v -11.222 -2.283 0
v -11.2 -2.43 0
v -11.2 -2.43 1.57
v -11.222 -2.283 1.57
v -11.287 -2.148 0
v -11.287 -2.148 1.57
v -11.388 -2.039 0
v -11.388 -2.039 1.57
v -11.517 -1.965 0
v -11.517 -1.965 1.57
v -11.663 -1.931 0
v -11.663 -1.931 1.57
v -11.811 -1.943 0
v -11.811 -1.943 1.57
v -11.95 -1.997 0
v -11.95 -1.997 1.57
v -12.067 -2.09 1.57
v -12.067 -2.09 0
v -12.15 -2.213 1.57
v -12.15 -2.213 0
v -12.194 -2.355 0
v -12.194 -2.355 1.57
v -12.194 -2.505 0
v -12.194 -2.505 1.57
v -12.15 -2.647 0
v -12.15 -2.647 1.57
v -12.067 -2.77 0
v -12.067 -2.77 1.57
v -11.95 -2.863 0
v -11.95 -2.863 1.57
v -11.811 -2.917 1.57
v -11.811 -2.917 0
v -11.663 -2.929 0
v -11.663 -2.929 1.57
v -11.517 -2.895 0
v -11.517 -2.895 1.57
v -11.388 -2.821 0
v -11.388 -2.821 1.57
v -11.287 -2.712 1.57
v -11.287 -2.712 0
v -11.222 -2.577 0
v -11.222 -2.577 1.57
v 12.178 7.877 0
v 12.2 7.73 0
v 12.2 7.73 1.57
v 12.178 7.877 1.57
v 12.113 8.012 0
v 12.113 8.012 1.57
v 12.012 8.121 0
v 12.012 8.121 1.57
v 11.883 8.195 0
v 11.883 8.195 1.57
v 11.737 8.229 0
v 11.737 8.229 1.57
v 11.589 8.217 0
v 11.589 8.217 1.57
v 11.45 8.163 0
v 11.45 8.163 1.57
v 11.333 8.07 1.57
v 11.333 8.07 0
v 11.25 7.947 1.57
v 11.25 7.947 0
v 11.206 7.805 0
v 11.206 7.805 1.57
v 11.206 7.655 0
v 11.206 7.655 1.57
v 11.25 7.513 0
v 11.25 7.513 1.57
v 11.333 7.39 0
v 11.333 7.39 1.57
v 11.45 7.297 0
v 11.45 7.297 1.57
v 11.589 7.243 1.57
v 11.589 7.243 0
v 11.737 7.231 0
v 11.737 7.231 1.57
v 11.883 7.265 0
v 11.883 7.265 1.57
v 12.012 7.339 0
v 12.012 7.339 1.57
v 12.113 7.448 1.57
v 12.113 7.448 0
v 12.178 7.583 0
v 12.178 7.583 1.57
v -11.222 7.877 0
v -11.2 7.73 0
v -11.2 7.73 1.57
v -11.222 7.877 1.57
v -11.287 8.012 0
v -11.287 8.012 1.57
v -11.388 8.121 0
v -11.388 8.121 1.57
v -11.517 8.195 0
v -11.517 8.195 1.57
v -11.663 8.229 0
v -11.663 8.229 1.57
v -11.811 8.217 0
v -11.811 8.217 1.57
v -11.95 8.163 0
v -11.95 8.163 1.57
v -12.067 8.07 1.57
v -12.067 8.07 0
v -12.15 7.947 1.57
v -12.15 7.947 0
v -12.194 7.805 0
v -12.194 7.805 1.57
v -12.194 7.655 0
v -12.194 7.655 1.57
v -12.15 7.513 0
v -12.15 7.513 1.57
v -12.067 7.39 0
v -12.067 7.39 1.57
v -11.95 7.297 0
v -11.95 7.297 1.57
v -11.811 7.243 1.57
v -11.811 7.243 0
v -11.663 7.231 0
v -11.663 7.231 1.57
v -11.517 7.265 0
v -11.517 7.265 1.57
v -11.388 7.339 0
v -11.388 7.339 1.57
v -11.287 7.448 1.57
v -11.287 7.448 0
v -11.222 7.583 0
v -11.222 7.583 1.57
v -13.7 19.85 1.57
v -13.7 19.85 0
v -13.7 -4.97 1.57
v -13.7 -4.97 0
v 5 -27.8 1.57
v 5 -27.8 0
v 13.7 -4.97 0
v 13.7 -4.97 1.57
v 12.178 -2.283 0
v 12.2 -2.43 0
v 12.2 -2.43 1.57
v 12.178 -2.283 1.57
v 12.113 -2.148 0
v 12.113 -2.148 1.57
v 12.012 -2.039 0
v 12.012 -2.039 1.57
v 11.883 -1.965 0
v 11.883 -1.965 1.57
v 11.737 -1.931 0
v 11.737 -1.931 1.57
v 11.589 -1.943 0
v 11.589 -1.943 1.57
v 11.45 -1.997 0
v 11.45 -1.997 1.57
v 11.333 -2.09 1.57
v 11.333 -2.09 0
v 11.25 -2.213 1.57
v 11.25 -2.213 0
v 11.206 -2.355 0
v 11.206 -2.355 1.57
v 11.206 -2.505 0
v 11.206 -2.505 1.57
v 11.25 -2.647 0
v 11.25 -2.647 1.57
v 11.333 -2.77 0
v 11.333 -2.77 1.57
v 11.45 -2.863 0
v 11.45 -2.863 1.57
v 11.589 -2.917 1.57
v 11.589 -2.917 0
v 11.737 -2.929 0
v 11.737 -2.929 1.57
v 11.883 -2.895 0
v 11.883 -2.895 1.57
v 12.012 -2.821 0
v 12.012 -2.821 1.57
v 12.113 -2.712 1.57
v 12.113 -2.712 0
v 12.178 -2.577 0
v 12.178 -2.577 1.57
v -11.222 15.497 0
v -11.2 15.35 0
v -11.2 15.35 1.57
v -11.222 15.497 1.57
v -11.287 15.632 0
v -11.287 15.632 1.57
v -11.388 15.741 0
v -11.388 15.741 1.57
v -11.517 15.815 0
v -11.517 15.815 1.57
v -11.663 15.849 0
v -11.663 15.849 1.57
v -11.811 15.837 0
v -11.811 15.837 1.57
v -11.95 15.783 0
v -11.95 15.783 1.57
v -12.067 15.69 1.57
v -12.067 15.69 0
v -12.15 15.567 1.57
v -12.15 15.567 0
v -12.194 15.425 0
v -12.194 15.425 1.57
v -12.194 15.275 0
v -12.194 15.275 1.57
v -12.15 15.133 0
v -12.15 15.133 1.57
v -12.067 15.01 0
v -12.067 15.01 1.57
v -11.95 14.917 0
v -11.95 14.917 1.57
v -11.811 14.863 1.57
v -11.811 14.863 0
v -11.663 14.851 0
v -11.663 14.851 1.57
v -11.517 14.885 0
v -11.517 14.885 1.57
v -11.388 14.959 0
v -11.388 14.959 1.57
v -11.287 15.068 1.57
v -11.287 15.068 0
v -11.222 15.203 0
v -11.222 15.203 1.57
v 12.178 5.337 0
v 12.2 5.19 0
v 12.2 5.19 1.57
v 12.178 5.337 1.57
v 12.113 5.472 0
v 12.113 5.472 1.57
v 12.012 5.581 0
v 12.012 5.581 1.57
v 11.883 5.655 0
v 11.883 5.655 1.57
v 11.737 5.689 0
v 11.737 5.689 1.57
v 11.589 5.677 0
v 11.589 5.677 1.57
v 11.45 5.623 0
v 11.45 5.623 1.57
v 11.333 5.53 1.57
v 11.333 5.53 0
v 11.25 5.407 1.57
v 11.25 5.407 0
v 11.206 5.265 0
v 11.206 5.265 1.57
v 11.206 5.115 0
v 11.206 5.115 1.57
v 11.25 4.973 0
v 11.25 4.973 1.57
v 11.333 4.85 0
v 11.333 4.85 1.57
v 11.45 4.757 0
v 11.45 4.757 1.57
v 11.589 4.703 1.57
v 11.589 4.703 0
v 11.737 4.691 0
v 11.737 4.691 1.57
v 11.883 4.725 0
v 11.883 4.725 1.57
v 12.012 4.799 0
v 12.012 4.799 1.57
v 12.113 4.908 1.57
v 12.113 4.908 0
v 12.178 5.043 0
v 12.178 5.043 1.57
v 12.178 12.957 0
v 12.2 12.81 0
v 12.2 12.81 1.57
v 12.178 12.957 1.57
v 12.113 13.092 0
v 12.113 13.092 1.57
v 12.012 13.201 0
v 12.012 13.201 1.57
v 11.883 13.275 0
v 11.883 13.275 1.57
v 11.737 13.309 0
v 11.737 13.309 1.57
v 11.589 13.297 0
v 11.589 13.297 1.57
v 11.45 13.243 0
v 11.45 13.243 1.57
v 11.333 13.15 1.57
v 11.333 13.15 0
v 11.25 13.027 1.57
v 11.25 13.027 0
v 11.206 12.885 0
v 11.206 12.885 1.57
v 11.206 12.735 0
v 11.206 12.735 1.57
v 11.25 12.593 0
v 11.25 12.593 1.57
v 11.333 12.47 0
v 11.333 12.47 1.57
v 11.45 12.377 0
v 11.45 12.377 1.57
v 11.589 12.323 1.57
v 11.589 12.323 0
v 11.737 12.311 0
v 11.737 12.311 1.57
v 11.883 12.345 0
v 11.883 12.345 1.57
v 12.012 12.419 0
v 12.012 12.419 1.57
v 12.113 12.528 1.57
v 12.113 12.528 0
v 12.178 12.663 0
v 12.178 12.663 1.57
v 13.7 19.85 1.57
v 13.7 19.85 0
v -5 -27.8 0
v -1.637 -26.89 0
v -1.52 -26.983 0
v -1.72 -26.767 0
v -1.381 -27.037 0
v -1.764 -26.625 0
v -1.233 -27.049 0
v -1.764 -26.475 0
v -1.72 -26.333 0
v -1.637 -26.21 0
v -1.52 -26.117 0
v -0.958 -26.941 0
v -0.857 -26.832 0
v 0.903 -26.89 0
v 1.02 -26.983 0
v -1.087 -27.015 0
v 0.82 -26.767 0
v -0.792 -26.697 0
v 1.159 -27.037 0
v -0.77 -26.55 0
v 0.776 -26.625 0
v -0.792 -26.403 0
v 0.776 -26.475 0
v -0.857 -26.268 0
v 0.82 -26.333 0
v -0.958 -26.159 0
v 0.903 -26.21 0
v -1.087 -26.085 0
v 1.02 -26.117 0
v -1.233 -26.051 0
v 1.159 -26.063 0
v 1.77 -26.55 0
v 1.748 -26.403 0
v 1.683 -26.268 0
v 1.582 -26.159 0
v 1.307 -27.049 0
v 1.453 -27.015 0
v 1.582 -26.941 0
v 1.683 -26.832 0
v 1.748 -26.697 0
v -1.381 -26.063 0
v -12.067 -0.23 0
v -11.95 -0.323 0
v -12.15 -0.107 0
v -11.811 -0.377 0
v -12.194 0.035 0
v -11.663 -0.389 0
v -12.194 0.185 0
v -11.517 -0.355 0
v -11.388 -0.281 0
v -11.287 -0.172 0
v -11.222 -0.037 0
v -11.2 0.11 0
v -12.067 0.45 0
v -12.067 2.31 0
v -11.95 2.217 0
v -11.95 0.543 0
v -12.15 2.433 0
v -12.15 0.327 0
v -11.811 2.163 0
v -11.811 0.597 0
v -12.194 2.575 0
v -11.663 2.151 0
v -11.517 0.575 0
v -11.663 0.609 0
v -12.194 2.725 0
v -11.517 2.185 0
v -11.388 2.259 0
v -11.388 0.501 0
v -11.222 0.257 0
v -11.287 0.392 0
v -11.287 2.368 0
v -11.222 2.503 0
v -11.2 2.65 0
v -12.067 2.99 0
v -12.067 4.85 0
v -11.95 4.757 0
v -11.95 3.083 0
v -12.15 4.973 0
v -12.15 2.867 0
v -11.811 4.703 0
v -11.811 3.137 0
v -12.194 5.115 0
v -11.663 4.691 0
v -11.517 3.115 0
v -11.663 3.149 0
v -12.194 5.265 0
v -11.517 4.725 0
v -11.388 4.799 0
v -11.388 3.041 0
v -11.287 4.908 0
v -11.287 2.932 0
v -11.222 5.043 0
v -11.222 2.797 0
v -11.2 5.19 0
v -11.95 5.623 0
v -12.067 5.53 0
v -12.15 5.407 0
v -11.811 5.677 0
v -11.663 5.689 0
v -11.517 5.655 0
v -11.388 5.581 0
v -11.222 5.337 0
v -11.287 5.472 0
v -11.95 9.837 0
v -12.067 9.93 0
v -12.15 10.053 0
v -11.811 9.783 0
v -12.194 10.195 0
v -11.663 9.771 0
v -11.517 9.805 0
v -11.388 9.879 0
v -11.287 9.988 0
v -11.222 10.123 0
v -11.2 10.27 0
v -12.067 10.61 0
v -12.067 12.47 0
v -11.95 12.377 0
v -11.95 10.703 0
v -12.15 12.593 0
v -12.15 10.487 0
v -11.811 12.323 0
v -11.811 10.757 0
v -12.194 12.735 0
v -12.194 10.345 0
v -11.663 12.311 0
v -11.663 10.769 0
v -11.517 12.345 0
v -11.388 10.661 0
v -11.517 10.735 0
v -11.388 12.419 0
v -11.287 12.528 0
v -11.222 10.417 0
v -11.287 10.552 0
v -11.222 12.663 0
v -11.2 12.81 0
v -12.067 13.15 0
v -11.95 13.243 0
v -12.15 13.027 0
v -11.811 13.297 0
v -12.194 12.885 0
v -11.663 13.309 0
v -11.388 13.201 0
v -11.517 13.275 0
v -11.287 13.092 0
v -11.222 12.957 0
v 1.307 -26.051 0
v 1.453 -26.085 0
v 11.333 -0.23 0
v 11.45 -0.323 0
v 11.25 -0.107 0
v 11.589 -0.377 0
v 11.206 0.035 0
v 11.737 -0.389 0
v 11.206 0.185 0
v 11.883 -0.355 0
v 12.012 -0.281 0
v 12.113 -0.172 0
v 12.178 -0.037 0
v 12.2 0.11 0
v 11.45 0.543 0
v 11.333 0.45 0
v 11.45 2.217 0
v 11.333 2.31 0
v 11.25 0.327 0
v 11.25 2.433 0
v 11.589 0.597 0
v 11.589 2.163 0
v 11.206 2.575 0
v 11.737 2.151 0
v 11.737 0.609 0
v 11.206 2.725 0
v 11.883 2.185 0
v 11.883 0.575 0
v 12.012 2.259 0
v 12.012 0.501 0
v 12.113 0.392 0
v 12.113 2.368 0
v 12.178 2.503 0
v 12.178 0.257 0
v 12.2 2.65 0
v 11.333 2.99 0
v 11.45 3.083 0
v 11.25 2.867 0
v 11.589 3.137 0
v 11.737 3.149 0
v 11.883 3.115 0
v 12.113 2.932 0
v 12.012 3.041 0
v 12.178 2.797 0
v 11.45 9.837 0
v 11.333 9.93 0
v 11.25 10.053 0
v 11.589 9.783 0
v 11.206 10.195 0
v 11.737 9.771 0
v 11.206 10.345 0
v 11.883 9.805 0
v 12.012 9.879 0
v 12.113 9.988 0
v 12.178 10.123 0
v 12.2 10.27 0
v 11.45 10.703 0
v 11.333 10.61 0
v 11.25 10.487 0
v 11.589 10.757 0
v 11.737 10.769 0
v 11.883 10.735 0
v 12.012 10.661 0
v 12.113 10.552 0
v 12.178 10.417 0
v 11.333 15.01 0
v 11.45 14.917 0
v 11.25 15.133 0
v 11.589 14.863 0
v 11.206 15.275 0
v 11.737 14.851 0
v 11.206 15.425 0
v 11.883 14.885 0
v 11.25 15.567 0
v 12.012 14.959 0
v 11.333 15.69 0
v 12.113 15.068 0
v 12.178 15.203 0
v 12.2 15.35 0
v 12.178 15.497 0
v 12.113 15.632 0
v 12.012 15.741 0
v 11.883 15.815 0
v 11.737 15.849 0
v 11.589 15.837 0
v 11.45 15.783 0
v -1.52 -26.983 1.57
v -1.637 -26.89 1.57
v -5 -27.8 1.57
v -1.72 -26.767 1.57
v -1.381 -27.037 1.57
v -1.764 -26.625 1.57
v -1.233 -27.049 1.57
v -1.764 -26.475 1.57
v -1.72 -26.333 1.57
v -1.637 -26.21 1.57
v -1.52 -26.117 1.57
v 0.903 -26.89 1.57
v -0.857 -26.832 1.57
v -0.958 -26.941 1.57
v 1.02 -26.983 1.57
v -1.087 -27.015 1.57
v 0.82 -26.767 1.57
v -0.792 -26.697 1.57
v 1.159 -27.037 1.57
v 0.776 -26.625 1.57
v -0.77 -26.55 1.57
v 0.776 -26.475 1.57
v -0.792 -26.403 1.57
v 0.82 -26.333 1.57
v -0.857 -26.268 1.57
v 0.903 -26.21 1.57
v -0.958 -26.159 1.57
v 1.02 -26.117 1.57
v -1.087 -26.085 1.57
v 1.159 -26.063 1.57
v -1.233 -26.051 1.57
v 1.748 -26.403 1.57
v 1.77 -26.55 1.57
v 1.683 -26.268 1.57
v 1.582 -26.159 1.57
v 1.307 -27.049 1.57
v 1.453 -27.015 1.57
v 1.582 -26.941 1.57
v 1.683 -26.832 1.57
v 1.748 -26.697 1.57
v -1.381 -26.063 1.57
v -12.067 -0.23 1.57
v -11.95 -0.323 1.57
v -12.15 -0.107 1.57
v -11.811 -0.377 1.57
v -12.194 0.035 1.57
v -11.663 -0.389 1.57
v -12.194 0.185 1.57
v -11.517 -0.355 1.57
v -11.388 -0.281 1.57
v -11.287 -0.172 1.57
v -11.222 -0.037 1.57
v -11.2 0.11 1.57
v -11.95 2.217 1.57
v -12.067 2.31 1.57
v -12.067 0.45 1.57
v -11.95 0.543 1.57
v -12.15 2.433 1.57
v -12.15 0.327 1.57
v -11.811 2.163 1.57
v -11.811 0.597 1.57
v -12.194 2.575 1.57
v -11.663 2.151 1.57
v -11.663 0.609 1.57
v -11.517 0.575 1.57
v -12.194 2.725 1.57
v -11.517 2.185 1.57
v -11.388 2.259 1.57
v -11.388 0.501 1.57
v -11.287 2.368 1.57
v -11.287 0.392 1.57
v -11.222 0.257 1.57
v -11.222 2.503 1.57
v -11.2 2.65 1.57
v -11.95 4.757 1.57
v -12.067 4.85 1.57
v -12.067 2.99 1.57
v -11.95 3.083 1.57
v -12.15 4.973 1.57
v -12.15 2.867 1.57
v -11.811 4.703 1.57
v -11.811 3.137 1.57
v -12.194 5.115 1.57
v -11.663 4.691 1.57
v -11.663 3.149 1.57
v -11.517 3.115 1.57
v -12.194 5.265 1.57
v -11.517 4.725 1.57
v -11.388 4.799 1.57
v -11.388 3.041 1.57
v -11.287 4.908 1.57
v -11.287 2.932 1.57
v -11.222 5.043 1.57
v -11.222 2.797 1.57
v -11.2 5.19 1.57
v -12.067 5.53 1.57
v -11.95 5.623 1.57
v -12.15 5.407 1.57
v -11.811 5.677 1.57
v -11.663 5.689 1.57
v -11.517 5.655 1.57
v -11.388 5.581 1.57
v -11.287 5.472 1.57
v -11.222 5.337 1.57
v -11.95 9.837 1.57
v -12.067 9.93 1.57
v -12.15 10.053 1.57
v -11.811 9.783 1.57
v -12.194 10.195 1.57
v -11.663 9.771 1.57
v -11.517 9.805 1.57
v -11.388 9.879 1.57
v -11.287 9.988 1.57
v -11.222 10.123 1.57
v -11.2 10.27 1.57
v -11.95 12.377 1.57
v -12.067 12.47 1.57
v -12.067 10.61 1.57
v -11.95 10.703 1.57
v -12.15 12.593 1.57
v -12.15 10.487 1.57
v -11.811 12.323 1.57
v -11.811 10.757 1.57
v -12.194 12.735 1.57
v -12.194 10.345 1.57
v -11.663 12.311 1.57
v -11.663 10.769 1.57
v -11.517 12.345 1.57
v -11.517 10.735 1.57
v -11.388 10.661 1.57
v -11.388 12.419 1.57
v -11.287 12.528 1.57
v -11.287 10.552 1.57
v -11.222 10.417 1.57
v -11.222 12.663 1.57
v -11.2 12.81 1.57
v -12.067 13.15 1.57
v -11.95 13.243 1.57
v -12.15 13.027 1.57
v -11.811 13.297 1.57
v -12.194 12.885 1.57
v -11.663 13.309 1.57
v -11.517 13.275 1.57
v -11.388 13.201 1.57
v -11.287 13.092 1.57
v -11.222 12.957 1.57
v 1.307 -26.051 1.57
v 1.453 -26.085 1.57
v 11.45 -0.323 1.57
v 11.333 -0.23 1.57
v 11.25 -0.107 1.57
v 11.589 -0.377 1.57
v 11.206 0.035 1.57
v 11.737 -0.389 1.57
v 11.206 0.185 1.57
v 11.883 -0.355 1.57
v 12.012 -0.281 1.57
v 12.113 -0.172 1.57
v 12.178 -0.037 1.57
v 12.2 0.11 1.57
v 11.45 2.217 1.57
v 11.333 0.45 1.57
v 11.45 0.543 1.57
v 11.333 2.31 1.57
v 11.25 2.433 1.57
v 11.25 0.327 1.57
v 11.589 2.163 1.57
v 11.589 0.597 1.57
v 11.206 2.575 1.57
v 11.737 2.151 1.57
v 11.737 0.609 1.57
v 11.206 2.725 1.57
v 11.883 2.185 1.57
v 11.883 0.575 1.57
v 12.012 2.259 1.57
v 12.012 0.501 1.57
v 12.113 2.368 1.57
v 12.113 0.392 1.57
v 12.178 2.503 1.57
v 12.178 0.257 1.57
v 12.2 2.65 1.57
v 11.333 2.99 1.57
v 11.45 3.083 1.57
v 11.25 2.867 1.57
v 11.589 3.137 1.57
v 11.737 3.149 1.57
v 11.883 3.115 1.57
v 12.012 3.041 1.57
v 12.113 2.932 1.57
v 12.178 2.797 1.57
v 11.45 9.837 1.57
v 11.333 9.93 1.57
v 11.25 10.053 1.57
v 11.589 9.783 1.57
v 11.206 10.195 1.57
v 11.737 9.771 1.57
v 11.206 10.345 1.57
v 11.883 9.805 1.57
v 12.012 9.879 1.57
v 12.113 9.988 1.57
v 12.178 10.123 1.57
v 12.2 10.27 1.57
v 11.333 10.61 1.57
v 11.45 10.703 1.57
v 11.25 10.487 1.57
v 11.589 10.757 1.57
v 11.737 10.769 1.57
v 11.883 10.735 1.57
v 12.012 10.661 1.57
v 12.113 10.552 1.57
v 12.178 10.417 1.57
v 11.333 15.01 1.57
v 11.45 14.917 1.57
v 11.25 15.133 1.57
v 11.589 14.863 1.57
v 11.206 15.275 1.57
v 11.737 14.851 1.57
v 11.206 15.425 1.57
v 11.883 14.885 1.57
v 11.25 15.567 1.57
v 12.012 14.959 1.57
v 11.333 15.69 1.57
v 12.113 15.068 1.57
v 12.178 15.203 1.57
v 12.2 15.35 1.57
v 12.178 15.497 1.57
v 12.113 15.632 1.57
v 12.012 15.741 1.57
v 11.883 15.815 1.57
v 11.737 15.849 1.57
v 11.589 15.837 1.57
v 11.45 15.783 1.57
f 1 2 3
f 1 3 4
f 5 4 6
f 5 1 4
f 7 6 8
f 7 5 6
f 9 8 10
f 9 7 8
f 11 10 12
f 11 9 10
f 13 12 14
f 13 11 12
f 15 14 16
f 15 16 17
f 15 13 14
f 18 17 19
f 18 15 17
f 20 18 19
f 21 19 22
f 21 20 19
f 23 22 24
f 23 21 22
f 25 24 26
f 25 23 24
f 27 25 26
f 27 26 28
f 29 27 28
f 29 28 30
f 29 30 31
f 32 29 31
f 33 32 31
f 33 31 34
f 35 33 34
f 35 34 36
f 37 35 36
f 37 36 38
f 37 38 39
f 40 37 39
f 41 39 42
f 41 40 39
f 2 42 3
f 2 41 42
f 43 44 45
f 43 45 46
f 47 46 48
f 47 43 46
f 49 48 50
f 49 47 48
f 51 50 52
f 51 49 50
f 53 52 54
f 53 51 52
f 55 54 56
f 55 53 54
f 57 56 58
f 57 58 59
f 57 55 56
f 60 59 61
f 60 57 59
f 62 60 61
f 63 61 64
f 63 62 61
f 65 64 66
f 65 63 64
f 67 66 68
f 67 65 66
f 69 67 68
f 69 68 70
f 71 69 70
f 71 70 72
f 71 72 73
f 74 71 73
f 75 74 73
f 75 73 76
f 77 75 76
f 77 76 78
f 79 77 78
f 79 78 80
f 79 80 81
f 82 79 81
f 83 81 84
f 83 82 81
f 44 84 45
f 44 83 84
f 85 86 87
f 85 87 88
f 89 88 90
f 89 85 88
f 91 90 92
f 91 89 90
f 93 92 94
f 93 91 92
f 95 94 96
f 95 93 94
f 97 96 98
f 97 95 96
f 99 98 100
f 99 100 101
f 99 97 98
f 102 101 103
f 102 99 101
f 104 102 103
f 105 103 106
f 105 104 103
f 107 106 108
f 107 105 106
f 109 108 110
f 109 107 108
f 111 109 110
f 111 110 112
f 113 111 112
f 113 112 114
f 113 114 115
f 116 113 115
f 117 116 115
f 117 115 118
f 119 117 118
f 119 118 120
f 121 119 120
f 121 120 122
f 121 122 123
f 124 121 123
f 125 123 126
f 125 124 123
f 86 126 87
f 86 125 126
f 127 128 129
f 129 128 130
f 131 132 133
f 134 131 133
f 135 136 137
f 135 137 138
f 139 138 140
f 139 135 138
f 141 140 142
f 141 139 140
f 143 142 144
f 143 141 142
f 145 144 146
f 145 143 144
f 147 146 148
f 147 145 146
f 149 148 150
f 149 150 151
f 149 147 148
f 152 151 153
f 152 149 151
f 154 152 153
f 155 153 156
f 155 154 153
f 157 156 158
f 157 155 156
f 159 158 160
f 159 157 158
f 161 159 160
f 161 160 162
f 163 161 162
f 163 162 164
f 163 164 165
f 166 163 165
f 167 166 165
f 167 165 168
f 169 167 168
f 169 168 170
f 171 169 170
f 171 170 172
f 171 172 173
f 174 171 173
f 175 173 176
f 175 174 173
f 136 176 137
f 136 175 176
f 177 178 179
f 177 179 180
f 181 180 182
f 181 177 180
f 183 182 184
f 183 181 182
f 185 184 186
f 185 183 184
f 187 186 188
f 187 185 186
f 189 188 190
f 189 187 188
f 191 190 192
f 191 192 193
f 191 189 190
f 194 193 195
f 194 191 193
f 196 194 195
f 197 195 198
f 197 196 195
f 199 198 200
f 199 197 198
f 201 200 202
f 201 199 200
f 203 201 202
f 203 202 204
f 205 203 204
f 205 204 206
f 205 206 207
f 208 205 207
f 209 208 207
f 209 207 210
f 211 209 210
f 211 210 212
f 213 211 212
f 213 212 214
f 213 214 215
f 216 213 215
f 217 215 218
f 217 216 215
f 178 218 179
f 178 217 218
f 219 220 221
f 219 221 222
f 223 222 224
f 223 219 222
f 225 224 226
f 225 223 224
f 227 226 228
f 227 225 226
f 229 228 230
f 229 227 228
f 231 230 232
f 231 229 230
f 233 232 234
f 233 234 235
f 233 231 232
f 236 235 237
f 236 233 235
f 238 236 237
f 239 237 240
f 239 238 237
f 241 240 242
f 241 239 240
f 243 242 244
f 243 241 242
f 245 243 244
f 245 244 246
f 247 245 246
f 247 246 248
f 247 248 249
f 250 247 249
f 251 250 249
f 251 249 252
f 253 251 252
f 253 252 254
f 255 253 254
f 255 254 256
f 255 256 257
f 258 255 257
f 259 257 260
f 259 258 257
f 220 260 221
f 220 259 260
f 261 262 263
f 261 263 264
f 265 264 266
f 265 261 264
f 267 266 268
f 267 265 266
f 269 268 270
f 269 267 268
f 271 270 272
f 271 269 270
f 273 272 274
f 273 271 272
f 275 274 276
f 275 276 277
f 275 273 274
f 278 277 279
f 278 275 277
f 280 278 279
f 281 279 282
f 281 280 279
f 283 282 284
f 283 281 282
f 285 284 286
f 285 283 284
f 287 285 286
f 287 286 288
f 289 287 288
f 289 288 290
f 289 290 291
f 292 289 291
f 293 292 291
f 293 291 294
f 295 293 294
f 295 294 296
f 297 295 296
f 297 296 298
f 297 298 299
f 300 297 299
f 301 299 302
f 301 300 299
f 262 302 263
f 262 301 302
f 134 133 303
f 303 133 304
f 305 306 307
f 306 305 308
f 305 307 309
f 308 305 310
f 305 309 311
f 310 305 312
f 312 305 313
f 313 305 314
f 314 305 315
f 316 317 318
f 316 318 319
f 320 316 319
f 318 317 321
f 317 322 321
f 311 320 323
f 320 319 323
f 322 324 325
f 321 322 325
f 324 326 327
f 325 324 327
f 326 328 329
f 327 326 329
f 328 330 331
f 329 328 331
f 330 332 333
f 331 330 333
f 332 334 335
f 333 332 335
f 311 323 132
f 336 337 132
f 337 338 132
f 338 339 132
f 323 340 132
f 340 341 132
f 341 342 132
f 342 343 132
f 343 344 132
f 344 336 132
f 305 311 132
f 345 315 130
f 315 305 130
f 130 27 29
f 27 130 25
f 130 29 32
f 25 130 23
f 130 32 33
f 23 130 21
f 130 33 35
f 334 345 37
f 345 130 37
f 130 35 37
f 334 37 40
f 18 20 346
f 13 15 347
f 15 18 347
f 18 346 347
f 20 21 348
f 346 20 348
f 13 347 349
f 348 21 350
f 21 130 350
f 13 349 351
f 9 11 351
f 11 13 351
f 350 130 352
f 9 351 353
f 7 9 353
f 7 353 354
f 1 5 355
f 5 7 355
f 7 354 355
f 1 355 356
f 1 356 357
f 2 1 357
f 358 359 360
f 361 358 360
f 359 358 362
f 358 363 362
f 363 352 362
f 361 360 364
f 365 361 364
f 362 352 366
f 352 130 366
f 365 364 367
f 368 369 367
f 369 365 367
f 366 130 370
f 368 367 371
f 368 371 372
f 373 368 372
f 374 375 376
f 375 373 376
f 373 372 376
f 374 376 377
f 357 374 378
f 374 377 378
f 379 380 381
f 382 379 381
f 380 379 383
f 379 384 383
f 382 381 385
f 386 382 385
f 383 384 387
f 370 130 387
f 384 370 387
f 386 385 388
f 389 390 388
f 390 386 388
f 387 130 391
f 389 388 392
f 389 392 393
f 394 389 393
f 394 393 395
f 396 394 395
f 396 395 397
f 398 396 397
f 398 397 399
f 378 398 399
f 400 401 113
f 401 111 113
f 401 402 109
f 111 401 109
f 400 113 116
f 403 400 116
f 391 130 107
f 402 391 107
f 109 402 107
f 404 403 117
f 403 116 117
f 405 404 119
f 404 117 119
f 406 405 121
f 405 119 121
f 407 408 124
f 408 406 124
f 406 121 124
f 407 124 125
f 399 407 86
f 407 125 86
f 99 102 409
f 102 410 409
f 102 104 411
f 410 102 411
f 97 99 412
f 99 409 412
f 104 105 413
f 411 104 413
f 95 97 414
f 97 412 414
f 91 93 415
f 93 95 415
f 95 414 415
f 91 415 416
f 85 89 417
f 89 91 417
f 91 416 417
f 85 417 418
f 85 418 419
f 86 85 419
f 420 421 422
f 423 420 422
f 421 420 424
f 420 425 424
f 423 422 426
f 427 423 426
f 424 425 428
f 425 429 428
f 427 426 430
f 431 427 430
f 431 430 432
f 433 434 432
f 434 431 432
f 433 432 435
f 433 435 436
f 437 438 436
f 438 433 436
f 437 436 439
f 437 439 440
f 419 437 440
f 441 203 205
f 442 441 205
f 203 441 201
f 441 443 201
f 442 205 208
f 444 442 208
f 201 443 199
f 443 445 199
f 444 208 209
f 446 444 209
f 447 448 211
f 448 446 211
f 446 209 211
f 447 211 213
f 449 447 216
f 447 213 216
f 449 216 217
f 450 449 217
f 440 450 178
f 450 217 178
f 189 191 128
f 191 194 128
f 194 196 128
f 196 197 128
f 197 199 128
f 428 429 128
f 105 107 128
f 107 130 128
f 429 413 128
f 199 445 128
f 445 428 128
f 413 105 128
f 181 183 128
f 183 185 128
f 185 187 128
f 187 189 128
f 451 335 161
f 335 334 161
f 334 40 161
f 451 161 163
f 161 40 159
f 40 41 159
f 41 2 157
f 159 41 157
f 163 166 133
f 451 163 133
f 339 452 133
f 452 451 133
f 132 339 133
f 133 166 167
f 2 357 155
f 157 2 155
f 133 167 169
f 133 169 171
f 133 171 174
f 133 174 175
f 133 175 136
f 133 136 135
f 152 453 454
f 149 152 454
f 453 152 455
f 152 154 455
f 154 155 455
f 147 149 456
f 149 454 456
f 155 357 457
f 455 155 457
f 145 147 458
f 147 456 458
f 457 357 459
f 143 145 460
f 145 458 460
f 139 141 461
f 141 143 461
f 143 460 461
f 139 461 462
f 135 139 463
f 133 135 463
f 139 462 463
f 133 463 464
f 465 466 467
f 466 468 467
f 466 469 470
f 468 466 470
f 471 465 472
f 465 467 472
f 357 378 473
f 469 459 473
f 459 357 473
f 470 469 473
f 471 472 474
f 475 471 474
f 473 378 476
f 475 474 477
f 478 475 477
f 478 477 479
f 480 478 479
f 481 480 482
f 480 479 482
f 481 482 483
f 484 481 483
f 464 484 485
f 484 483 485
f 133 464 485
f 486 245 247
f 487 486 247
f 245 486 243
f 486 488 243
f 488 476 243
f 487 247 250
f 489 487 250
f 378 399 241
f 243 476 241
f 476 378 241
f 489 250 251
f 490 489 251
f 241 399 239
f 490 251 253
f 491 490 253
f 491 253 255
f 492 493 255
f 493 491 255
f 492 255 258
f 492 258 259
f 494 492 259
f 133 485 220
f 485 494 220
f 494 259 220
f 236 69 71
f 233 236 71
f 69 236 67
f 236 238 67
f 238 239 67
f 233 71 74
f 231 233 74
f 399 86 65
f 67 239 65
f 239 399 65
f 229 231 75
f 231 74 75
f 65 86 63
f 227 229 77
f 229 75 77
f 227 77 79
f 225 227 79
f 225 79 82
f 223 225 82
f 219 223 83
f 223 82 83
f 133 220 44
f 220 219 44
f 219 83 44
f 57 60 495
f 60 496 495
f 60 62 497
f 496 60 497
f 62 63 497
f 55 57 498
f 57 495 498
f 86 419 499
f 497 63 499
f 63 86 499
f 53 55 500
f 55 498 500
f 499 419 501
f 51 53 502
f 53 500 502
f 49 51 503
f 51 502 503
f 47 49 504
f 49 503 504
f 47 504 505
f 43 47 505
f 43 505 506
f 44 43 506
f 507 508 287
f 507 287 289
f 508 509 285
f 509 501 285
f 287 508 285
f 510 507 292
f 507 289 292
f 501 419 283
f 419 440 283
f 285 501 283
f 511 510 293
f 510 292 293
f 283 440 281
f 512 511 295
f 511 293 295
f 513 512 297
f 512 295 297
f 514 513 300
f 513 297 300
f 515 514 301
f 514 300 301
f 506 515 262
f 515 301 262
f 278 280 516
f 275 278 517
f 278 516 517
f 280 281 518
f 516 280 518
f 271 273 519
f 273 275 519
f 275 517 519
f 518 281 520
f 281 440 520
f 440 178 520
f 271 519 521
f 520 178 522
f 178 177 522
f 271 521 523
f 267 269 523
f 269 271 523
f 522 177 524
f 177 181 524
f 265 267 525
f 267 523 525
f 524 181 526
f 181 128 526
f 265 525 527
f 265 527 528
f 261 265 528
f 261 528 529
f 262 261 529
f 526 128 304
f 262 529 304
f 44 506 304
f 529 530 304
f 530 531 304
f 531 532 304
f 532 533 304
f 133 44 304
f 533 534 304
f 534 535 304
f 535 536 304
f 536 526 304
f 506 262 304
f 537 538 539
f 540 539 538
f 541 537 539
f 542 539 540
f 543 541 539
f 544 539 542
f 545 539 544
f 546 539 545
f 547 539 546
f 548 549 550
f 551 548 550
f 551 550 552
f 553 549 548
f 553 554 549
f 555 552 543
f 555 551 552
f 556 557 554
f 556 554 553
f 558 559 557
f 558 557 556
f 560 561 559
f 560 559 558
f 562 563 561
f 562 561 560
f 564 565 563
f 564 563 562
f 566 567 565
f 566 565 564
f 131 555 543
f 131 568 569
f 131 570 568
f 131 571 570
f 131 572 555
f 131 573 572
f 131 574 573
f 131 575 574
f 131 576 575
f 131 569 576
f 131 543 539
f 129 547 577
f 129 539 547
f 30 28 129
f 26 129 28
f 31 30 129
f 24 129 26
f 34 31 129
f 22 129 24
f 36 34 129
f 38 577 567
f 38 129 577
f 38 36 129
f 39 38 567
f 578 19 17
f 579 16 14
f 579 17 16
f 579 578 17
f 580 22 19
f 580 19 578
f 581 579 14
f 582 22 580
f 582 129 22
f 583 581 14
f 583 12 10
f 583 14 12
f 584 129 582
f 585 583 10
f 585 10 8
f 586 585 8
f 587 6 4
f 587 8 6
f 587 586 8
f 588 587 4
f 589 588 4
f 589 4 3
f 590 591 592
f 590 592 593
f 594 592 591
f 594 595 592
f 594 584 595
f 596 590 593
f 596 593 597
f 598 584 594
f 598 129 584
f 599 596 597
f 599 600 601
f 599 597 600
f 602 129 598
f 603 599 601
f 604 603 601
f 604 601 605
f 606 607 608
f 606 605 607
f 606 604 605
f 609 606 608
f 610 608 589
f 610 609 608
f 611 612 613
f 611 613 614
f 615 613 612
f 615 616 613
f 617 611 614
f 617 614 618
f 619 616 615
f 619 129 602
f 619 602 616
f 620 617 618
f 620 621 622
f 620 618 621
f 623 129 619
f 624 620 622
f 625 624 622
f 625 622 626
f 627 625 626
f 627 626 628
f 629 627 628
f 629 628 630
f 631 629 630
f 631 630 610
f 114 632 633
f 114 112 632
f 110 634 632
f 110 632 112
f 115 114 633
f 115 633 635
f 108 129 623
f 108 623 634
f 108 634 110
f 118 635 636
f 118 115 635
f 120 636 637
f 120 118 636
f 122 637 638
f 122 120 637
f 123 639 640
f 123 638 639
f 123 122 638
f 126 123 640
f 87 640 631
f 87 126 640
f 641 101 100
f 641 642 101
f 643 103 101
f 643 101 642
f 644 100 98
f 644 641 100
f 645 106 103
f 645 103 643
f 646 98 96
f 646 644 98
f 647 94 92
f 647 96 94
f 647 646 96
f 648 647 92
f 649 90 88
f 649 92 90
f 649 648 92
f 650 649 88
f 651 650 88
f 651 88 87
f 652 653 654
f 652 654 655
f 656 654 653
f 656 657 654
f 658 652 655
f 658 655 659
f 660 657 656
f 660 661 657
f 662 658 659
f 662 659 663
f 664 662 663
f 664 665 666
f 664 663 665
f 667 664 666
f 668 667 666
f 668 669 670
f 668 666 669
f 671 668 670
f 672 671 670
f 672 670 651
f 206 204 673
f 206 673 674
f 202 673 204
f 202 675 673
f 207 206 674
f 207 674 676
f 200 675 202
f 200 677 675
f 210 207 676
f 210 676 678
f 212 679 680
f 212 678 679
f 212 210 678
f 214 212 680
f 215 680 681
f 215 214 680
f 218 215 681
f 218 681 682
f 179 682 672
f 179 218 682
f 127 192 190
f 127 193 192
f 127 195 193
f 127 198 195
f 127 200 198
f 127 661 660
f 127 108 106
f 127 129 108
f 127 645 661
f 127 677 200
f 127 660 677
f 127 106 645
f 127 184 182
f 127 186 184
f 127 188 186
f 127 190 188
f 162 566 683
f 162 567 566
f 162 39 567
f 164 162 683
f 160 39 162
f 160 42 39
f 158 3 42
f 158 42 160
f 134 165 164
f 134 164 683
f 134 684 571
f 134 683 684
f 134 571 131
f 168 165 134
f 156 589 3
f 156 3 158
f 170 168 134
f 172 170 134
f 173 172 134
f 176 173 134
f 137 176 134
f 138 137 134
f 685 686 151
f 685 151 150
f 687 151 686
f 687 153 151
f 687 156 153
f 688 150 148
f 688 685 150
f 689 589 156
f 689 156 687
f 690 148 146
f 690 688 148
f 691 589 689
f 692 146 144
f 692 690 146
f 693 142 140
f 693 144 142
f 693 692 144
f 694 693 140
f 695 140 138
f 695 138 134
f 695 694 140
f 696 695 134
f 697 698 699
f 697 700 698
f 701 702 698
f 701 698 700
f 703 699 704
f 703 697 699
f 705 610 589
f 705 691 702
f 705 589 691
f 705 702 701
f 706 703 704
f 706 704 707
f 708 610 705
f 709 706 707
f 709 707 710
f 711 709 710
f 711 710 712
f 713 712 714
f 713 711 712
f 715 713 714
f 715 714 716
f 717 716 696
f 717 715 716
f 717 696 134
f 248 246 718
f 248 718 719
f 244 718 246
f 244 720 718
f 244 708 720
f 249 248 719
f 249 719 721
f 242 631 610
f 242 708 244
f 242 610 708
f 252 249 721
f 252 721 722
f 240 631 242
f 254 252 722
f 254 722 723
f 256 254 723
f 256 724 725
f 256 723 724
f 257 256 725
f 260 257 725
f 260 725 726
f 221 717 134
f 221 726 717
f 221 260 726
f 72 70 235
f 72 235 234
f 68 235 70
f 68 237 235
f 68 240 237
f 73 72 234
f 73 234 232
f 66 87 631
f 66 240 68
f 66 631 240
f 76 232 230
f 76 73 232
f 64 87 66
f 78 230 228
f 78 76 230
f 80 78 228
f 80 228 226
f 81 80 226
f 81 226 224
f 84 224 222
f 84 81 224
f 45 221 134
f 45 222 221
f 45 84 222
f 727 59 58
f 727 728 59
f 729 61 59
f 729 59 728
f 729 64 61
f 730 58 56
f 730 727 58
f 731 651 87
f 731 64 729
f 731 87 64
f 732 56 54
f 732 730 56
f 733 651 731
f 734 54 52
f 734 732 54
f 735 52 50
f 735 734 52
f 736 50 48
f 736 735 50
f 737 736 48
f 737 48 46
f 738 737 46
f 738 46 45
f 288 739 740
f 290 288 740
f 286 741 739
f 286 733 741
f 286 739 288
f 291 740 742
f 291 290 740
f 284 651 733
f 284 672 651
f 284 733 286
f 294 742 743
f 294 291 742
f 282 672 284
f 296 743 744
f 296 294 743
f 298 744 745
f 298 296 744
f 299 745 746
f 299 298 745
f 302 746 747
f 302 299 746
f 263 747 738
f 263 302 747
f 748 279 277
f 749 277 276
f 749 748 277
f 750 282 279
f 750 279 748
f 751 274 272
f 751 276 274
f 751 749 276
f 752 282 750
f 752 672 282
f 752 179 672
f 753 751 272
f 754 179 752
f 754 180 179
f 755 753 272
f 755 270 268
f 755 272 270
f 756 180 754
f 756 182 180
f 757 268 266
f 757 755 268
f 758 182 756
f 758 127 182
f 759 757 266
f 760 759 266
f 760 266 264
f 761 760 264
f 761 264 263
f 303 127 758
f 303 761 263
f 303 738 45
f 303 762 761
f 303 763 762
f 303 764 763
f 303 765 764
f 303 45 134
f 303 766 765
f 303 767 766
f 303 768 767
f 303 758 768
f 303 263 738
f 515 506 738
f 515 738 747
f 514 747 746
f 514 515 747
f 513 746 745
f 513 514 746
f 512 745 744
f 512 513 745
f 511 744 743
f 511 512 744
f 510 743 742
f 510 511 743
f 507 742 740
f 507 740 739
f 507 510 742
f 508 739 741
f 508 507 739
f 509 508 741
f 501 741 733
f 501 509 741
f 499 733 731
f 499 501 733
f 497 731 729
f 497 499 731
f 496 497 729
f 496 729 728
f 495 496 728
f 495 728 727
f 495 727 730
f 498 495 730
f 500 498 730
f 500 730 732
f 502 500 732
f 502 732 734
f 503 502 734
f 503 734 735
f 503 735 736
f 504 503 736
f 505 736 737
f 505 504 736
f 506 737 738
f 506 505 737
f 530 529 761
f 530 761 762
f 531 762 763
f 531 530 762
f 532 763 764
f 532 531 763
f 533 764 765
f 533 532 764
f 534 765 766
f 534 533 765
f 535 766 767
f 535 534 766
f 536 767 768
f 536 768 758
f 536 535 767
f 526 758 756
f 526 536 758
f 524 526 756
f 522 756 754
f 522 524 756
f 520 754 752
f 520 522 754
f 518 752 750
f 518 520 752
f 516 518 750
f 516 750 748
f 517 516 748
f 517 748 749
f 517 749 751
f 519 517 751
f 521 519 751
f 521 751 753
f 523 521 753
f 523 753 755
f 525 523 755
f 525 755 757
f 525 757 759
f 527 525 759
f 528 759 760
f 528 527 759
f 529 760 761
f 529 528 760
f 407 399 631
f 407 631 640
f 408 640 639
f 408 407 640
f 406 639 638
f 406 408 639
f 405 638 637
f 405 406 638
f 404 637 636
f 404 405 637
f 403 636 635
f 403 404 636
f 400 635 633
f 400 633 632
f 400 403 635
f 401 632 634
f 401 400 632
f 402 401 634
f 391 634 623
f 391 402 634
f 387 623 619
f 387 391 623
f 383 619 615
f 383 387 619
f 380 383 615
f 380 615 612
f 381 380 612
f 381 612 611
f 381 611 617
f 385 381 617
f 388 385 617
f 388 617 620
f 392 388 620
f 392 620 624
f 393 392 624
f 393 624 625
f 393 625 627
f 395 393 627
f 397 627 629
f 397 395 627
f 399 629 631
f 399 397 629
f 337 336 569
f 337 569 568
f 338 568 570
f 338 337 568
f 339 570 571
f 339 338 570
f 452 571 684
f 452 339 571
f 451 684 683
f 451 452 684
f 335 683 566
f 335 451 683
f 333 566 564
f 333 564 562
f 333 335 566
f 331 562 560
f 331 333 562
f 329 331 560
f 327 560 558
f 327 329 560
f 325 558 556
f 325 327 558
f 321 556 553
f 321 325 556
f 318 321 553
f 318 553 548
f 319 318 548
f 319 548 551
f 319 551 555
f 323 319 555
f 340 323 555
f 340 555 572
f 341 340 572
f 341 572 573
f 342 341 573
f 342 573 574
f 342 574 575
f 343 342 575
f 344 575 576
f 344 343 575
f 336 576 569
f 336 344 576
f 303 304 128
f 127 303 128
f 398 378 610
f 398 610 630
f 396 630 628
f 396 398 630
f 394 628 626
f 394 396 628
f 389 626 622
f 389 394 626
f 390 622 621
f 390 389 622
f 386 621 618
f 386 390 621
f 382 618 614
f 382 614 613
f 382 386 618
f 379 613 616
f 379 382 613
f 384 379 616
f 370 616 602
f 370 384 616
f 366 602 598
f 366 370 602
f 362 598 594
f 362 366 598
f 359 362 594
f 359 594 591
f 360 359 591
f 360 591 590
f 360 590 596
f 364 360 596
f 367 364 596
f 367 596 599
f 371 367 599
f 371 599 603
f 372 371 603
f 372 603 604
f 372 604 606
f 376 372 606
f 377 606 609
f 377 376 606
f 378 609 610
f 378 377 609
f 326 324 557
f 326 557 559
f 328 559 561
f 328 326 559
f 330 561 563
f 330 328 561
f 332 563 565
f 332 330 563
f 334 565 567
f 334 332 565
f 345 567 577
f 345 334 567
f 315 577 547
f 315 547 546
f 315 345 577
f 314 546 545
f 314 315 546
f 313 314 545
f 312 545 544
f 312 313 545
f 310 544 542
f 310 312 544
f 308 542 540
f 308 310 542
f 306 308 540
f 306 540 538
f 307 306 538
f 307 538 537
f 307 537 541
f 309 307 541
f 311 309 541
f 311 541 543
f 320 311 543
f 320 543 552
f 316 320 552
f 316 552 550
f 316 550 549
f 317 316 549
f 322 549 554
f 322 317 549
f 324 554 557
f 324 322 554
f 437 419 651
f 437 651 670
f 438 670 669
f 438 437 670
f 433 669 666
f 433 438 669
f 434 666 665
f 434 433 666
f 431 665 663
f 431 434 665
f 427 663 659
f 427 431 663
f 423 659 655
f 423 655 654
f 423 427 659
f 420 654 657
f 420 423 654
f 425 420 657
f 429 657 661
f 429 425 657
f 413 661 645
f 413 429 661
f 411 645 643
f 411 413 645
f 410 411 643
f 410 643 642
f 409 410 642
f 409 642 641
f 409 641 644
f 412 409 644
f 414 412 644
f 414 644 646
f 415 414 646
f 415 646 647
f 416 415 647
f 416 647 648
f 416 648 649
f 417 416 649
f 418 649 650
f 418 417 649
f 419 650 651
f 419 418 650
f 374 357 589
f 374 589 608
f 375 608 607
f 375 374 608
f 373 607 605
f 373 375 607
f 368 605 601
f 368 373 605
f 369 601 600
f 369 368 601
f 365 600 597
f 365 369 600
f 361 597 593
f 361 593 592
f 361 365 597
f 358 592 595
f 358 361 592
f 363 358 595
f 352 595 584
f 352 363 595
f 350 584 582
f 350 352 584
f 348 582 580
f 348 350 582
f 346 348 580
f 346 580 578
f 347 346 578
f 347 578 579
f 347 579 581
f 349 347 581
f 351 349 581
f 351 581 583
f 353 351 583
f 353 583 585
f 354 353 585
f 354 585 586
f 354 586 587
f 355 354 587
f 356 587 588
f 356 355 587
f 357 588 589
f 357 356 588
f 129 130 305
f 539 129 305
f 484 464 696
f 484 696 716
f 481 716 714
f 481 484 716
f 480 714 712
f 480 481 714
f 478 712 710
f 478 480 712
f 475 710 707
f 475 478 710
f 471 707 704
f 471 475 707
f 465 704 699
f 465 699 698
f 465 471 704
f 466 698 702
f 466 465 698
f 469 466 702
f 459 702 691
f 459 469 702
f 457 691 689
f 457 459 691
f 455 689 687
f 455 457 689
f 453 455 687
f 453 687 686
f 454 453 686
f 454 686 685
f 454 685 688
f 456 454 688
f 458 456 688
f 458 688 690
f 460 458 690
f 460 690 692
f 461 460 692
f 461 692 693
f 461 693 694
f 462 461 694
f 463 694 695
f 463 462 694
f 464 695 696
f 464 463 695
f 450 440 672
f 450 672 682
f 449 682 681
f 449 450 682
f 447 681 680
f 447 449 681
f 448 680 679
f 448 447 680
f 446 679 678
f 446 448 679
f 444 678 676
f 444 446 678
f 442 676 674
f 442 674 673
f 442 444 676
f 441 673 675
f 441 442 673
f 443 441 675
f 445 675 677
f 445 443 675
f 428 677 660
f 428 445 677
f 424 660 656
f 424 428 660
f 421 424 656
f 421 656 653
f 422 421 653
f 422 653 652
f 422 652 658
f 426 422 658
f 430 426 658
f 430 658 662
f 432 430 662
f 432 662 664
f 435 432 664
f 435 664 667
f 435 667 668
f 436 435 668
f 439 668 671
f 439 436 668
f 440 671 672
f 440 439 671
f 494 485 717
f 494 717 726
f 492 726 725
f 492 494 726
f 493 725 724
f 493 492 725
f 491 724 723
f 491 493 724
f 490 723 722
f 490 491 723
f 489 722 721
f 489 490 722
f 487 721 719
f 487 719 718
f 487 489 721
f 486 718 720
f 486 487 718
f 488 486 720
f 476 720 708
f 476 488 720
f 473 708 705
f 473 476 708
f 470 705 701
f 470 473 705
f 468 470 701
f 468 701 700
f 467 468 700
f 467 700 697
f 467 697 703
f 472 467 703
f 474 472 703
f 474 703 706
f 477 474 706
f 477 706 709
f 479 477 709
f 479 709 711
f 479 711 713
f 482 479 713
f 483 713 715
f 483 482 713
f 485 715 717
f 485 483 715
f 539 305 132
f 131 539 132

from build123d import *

# Parameters (mm, degrees)
SKETCH1_R           = 0.5
BOSS_EXTRUDE1_DEPTH = 1.57


with BuildPart() as part:
    # Sketch1 → Boss-Extrude1 (new body)
    with BuildSketch(Plane.XY):
        Polygon((13.7, 19.85), (-13.7, 19.85), (-13.7, -4.97), (-5, -27.8), (5, -27.8), (13.7, -4.97), align=None)
        with Locations((11.7, -2.43)):
            Circle(SKETCH1_R, mode=Mode.SUBTRACT)
        with Locations((11.7, 0.11)):
            Circle(SKETCH1_R, mode=Mode.SUBTRACT)
        with Locations((11.7, 2.65)):
            Circle(SKETCH1_R, mode=Mode.SUBTRACT)
        with Locations((11.7, 5.19)):
            Circle(SKETCH1_R, mode=Mode.SUBTRACT)
        with Locations((11.7, 7.73)):
            Circle(SKETCH1_R, mode=Mode.SUBTRACT)
        with Locations((11.7, 10.27)):
            Circle(SKETCH1_R, mode=Mode.SUBTRACT)
        with Locations((11.7, 12.81)):
            Circle(SKETCH1_R, mode=Mode.SUBTRACT)
        with Locations((11.7, 15.35)):
            Circle(SKETCH1_R, mode=Mode.SUBTRACT)
        with Locations((-11.7, 15.35)):
            Circle(SKETCH1_R, mode=Mode.SUBTRACT)
        with Locations((-11.7, -2.43)):
            Circle(SKETCH1_R, mode=Mode.SUBTRACT)
        with Locations((-11.7, 0.11)):
            Circle(SKETCH1_R, mode=Mode.SUBTRACT)
        with Locations((-11.7, 2.65)):
            Circle(SKETCH1_R, mode=Mode.SUBTRACT)
        with Locations((-11.7, 5.19)):
            Circle(SKETCH1_R, mode=Mode.SUBTRACT)
        with Locations((-11.7, 7.73)):
            Circle(SKETCH1_R, mode=Mode.SUBTRACT)
        with Locations((-11.7, 10.27)):
            Circle(SKETCH1_R, mode=Mode.SUBTRACT)
        with Locations((-11.7, 12.81)):
            Circle(SKETCH1_R, mode=Mode.SUBTRACT)
        with Locations((-1.27, -26.55)):
            Circle(SKETCH1_R, mode=Mode.SUBTRACT)
        with Locations((1.27, -26.55)):
            Circle(SKETCH1_R, mode=Mode.SUBTRACT)
    extrude(amount=BOSS_EXTRUDE1_DEPTH)


solid = part.part
